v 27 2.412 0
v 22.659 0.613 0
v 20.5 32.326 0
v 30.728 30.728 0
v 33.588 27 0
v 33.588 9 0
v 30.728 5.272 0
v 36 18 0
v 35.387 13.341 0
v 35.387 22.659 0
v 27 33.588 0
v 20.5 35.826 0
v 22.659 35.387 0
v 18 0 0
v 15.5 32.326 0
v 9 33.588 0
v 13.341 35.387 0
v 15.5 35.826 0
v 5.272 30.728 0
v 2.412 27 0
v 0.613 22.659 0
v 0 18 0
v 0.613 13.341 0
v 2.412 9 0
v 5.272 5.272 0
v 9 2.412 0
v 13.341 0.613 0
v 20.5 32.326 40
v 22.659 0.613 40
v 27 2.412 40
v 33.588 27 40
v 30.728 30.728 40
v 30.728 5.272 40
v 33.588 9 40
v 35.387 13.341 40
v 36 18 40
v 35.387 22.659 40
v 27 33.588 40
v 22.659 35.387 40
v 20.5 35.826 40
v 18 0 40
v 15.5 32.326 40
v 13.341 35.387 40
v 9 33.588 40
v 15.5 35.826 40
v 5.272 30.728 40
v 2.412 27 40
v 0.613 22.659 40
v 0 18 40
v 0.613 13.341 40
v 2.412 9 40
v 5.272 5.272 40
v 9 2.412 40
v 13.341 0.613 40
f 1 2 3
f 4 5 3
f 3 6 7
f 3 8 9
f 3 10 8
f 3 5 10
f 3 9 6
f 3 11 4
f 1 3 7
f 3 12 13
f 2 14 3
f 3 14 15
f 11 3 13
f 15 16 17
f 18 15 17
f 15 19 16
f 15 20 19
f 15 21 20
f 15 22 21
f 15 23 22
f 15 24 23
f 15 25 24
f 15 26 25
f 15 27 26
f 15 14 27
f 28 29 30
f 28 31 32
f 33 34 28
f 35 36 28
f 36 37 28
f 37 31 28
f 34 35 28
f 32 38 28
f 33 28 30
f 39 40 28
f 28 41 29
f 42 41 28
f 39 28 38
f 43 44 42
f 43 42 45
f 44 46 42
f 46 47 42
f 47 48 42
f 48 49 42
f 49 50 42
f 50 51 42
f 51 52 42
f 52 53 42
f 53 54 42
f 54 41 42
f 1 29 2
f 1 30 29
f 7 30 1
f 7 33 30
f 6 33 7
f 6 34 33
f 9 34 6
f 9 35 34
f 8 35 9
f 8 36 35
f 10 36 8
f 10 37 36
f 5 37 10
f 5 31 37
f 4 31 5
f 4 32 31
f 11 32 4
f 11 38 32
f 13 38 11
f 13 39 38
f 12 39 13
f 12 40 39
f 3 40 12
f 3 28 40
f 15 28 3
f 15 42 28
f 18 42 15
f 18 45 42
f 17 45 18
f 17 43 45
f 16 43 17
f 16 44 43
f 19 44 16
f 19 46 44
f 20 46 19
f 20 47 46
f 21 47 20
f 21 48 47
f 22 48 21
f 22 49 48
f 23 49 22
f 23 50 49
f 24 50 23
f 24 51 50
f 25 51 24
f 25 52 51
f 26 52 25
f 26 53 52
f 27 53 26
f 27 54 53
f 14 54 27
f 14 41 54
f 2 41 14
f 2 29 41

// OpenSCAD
$fn = 32;

// ----------------------------------------------------------------------
// Keyway shaft: d36 shaft, key 5 x 3.5 mm
// ----------------------------------------------------------------------

// --- parameters (mm) ---
shaft_r = 18;             // shaft radius
key_w = 5;                // keyway width
key_d = 3.5;              // keyway depth below the surface line
plate_t = 40;             // shaft length, Z (extrusion height)

shaft_d = 2 * shaft_r;  // shaft diameter
circle_step = 15;  // polygon sampling step, degrees

profile = [[13.341, 35.387], [9, 33.588], [5.272, 30.728], [2.412, 27], [0.613, 22.659], [0, 18], [0.613, 13.341], [2.412, 9], [5.272, 5.272], [9, 2.412], [13.341, 0.613], [18, 0], [22.659, 0.613], [27, 2.412], [30.728, 5.272], [33.588, 9], [35.387, 13.341], [36, 18], [35.387, 22.659], [33.588, 27], [30.728, 30.728], [27, 33.588], [22.659, 35.387], [20.5, 35.826], [20.5, 32.326], [15.5, 32.326], [15.5, 35.826]];  // primary outline, 27 points, counter clockwise

// --- the one profile operation ---
linear_extrude(height = plate_t) polygon(points = profile);
